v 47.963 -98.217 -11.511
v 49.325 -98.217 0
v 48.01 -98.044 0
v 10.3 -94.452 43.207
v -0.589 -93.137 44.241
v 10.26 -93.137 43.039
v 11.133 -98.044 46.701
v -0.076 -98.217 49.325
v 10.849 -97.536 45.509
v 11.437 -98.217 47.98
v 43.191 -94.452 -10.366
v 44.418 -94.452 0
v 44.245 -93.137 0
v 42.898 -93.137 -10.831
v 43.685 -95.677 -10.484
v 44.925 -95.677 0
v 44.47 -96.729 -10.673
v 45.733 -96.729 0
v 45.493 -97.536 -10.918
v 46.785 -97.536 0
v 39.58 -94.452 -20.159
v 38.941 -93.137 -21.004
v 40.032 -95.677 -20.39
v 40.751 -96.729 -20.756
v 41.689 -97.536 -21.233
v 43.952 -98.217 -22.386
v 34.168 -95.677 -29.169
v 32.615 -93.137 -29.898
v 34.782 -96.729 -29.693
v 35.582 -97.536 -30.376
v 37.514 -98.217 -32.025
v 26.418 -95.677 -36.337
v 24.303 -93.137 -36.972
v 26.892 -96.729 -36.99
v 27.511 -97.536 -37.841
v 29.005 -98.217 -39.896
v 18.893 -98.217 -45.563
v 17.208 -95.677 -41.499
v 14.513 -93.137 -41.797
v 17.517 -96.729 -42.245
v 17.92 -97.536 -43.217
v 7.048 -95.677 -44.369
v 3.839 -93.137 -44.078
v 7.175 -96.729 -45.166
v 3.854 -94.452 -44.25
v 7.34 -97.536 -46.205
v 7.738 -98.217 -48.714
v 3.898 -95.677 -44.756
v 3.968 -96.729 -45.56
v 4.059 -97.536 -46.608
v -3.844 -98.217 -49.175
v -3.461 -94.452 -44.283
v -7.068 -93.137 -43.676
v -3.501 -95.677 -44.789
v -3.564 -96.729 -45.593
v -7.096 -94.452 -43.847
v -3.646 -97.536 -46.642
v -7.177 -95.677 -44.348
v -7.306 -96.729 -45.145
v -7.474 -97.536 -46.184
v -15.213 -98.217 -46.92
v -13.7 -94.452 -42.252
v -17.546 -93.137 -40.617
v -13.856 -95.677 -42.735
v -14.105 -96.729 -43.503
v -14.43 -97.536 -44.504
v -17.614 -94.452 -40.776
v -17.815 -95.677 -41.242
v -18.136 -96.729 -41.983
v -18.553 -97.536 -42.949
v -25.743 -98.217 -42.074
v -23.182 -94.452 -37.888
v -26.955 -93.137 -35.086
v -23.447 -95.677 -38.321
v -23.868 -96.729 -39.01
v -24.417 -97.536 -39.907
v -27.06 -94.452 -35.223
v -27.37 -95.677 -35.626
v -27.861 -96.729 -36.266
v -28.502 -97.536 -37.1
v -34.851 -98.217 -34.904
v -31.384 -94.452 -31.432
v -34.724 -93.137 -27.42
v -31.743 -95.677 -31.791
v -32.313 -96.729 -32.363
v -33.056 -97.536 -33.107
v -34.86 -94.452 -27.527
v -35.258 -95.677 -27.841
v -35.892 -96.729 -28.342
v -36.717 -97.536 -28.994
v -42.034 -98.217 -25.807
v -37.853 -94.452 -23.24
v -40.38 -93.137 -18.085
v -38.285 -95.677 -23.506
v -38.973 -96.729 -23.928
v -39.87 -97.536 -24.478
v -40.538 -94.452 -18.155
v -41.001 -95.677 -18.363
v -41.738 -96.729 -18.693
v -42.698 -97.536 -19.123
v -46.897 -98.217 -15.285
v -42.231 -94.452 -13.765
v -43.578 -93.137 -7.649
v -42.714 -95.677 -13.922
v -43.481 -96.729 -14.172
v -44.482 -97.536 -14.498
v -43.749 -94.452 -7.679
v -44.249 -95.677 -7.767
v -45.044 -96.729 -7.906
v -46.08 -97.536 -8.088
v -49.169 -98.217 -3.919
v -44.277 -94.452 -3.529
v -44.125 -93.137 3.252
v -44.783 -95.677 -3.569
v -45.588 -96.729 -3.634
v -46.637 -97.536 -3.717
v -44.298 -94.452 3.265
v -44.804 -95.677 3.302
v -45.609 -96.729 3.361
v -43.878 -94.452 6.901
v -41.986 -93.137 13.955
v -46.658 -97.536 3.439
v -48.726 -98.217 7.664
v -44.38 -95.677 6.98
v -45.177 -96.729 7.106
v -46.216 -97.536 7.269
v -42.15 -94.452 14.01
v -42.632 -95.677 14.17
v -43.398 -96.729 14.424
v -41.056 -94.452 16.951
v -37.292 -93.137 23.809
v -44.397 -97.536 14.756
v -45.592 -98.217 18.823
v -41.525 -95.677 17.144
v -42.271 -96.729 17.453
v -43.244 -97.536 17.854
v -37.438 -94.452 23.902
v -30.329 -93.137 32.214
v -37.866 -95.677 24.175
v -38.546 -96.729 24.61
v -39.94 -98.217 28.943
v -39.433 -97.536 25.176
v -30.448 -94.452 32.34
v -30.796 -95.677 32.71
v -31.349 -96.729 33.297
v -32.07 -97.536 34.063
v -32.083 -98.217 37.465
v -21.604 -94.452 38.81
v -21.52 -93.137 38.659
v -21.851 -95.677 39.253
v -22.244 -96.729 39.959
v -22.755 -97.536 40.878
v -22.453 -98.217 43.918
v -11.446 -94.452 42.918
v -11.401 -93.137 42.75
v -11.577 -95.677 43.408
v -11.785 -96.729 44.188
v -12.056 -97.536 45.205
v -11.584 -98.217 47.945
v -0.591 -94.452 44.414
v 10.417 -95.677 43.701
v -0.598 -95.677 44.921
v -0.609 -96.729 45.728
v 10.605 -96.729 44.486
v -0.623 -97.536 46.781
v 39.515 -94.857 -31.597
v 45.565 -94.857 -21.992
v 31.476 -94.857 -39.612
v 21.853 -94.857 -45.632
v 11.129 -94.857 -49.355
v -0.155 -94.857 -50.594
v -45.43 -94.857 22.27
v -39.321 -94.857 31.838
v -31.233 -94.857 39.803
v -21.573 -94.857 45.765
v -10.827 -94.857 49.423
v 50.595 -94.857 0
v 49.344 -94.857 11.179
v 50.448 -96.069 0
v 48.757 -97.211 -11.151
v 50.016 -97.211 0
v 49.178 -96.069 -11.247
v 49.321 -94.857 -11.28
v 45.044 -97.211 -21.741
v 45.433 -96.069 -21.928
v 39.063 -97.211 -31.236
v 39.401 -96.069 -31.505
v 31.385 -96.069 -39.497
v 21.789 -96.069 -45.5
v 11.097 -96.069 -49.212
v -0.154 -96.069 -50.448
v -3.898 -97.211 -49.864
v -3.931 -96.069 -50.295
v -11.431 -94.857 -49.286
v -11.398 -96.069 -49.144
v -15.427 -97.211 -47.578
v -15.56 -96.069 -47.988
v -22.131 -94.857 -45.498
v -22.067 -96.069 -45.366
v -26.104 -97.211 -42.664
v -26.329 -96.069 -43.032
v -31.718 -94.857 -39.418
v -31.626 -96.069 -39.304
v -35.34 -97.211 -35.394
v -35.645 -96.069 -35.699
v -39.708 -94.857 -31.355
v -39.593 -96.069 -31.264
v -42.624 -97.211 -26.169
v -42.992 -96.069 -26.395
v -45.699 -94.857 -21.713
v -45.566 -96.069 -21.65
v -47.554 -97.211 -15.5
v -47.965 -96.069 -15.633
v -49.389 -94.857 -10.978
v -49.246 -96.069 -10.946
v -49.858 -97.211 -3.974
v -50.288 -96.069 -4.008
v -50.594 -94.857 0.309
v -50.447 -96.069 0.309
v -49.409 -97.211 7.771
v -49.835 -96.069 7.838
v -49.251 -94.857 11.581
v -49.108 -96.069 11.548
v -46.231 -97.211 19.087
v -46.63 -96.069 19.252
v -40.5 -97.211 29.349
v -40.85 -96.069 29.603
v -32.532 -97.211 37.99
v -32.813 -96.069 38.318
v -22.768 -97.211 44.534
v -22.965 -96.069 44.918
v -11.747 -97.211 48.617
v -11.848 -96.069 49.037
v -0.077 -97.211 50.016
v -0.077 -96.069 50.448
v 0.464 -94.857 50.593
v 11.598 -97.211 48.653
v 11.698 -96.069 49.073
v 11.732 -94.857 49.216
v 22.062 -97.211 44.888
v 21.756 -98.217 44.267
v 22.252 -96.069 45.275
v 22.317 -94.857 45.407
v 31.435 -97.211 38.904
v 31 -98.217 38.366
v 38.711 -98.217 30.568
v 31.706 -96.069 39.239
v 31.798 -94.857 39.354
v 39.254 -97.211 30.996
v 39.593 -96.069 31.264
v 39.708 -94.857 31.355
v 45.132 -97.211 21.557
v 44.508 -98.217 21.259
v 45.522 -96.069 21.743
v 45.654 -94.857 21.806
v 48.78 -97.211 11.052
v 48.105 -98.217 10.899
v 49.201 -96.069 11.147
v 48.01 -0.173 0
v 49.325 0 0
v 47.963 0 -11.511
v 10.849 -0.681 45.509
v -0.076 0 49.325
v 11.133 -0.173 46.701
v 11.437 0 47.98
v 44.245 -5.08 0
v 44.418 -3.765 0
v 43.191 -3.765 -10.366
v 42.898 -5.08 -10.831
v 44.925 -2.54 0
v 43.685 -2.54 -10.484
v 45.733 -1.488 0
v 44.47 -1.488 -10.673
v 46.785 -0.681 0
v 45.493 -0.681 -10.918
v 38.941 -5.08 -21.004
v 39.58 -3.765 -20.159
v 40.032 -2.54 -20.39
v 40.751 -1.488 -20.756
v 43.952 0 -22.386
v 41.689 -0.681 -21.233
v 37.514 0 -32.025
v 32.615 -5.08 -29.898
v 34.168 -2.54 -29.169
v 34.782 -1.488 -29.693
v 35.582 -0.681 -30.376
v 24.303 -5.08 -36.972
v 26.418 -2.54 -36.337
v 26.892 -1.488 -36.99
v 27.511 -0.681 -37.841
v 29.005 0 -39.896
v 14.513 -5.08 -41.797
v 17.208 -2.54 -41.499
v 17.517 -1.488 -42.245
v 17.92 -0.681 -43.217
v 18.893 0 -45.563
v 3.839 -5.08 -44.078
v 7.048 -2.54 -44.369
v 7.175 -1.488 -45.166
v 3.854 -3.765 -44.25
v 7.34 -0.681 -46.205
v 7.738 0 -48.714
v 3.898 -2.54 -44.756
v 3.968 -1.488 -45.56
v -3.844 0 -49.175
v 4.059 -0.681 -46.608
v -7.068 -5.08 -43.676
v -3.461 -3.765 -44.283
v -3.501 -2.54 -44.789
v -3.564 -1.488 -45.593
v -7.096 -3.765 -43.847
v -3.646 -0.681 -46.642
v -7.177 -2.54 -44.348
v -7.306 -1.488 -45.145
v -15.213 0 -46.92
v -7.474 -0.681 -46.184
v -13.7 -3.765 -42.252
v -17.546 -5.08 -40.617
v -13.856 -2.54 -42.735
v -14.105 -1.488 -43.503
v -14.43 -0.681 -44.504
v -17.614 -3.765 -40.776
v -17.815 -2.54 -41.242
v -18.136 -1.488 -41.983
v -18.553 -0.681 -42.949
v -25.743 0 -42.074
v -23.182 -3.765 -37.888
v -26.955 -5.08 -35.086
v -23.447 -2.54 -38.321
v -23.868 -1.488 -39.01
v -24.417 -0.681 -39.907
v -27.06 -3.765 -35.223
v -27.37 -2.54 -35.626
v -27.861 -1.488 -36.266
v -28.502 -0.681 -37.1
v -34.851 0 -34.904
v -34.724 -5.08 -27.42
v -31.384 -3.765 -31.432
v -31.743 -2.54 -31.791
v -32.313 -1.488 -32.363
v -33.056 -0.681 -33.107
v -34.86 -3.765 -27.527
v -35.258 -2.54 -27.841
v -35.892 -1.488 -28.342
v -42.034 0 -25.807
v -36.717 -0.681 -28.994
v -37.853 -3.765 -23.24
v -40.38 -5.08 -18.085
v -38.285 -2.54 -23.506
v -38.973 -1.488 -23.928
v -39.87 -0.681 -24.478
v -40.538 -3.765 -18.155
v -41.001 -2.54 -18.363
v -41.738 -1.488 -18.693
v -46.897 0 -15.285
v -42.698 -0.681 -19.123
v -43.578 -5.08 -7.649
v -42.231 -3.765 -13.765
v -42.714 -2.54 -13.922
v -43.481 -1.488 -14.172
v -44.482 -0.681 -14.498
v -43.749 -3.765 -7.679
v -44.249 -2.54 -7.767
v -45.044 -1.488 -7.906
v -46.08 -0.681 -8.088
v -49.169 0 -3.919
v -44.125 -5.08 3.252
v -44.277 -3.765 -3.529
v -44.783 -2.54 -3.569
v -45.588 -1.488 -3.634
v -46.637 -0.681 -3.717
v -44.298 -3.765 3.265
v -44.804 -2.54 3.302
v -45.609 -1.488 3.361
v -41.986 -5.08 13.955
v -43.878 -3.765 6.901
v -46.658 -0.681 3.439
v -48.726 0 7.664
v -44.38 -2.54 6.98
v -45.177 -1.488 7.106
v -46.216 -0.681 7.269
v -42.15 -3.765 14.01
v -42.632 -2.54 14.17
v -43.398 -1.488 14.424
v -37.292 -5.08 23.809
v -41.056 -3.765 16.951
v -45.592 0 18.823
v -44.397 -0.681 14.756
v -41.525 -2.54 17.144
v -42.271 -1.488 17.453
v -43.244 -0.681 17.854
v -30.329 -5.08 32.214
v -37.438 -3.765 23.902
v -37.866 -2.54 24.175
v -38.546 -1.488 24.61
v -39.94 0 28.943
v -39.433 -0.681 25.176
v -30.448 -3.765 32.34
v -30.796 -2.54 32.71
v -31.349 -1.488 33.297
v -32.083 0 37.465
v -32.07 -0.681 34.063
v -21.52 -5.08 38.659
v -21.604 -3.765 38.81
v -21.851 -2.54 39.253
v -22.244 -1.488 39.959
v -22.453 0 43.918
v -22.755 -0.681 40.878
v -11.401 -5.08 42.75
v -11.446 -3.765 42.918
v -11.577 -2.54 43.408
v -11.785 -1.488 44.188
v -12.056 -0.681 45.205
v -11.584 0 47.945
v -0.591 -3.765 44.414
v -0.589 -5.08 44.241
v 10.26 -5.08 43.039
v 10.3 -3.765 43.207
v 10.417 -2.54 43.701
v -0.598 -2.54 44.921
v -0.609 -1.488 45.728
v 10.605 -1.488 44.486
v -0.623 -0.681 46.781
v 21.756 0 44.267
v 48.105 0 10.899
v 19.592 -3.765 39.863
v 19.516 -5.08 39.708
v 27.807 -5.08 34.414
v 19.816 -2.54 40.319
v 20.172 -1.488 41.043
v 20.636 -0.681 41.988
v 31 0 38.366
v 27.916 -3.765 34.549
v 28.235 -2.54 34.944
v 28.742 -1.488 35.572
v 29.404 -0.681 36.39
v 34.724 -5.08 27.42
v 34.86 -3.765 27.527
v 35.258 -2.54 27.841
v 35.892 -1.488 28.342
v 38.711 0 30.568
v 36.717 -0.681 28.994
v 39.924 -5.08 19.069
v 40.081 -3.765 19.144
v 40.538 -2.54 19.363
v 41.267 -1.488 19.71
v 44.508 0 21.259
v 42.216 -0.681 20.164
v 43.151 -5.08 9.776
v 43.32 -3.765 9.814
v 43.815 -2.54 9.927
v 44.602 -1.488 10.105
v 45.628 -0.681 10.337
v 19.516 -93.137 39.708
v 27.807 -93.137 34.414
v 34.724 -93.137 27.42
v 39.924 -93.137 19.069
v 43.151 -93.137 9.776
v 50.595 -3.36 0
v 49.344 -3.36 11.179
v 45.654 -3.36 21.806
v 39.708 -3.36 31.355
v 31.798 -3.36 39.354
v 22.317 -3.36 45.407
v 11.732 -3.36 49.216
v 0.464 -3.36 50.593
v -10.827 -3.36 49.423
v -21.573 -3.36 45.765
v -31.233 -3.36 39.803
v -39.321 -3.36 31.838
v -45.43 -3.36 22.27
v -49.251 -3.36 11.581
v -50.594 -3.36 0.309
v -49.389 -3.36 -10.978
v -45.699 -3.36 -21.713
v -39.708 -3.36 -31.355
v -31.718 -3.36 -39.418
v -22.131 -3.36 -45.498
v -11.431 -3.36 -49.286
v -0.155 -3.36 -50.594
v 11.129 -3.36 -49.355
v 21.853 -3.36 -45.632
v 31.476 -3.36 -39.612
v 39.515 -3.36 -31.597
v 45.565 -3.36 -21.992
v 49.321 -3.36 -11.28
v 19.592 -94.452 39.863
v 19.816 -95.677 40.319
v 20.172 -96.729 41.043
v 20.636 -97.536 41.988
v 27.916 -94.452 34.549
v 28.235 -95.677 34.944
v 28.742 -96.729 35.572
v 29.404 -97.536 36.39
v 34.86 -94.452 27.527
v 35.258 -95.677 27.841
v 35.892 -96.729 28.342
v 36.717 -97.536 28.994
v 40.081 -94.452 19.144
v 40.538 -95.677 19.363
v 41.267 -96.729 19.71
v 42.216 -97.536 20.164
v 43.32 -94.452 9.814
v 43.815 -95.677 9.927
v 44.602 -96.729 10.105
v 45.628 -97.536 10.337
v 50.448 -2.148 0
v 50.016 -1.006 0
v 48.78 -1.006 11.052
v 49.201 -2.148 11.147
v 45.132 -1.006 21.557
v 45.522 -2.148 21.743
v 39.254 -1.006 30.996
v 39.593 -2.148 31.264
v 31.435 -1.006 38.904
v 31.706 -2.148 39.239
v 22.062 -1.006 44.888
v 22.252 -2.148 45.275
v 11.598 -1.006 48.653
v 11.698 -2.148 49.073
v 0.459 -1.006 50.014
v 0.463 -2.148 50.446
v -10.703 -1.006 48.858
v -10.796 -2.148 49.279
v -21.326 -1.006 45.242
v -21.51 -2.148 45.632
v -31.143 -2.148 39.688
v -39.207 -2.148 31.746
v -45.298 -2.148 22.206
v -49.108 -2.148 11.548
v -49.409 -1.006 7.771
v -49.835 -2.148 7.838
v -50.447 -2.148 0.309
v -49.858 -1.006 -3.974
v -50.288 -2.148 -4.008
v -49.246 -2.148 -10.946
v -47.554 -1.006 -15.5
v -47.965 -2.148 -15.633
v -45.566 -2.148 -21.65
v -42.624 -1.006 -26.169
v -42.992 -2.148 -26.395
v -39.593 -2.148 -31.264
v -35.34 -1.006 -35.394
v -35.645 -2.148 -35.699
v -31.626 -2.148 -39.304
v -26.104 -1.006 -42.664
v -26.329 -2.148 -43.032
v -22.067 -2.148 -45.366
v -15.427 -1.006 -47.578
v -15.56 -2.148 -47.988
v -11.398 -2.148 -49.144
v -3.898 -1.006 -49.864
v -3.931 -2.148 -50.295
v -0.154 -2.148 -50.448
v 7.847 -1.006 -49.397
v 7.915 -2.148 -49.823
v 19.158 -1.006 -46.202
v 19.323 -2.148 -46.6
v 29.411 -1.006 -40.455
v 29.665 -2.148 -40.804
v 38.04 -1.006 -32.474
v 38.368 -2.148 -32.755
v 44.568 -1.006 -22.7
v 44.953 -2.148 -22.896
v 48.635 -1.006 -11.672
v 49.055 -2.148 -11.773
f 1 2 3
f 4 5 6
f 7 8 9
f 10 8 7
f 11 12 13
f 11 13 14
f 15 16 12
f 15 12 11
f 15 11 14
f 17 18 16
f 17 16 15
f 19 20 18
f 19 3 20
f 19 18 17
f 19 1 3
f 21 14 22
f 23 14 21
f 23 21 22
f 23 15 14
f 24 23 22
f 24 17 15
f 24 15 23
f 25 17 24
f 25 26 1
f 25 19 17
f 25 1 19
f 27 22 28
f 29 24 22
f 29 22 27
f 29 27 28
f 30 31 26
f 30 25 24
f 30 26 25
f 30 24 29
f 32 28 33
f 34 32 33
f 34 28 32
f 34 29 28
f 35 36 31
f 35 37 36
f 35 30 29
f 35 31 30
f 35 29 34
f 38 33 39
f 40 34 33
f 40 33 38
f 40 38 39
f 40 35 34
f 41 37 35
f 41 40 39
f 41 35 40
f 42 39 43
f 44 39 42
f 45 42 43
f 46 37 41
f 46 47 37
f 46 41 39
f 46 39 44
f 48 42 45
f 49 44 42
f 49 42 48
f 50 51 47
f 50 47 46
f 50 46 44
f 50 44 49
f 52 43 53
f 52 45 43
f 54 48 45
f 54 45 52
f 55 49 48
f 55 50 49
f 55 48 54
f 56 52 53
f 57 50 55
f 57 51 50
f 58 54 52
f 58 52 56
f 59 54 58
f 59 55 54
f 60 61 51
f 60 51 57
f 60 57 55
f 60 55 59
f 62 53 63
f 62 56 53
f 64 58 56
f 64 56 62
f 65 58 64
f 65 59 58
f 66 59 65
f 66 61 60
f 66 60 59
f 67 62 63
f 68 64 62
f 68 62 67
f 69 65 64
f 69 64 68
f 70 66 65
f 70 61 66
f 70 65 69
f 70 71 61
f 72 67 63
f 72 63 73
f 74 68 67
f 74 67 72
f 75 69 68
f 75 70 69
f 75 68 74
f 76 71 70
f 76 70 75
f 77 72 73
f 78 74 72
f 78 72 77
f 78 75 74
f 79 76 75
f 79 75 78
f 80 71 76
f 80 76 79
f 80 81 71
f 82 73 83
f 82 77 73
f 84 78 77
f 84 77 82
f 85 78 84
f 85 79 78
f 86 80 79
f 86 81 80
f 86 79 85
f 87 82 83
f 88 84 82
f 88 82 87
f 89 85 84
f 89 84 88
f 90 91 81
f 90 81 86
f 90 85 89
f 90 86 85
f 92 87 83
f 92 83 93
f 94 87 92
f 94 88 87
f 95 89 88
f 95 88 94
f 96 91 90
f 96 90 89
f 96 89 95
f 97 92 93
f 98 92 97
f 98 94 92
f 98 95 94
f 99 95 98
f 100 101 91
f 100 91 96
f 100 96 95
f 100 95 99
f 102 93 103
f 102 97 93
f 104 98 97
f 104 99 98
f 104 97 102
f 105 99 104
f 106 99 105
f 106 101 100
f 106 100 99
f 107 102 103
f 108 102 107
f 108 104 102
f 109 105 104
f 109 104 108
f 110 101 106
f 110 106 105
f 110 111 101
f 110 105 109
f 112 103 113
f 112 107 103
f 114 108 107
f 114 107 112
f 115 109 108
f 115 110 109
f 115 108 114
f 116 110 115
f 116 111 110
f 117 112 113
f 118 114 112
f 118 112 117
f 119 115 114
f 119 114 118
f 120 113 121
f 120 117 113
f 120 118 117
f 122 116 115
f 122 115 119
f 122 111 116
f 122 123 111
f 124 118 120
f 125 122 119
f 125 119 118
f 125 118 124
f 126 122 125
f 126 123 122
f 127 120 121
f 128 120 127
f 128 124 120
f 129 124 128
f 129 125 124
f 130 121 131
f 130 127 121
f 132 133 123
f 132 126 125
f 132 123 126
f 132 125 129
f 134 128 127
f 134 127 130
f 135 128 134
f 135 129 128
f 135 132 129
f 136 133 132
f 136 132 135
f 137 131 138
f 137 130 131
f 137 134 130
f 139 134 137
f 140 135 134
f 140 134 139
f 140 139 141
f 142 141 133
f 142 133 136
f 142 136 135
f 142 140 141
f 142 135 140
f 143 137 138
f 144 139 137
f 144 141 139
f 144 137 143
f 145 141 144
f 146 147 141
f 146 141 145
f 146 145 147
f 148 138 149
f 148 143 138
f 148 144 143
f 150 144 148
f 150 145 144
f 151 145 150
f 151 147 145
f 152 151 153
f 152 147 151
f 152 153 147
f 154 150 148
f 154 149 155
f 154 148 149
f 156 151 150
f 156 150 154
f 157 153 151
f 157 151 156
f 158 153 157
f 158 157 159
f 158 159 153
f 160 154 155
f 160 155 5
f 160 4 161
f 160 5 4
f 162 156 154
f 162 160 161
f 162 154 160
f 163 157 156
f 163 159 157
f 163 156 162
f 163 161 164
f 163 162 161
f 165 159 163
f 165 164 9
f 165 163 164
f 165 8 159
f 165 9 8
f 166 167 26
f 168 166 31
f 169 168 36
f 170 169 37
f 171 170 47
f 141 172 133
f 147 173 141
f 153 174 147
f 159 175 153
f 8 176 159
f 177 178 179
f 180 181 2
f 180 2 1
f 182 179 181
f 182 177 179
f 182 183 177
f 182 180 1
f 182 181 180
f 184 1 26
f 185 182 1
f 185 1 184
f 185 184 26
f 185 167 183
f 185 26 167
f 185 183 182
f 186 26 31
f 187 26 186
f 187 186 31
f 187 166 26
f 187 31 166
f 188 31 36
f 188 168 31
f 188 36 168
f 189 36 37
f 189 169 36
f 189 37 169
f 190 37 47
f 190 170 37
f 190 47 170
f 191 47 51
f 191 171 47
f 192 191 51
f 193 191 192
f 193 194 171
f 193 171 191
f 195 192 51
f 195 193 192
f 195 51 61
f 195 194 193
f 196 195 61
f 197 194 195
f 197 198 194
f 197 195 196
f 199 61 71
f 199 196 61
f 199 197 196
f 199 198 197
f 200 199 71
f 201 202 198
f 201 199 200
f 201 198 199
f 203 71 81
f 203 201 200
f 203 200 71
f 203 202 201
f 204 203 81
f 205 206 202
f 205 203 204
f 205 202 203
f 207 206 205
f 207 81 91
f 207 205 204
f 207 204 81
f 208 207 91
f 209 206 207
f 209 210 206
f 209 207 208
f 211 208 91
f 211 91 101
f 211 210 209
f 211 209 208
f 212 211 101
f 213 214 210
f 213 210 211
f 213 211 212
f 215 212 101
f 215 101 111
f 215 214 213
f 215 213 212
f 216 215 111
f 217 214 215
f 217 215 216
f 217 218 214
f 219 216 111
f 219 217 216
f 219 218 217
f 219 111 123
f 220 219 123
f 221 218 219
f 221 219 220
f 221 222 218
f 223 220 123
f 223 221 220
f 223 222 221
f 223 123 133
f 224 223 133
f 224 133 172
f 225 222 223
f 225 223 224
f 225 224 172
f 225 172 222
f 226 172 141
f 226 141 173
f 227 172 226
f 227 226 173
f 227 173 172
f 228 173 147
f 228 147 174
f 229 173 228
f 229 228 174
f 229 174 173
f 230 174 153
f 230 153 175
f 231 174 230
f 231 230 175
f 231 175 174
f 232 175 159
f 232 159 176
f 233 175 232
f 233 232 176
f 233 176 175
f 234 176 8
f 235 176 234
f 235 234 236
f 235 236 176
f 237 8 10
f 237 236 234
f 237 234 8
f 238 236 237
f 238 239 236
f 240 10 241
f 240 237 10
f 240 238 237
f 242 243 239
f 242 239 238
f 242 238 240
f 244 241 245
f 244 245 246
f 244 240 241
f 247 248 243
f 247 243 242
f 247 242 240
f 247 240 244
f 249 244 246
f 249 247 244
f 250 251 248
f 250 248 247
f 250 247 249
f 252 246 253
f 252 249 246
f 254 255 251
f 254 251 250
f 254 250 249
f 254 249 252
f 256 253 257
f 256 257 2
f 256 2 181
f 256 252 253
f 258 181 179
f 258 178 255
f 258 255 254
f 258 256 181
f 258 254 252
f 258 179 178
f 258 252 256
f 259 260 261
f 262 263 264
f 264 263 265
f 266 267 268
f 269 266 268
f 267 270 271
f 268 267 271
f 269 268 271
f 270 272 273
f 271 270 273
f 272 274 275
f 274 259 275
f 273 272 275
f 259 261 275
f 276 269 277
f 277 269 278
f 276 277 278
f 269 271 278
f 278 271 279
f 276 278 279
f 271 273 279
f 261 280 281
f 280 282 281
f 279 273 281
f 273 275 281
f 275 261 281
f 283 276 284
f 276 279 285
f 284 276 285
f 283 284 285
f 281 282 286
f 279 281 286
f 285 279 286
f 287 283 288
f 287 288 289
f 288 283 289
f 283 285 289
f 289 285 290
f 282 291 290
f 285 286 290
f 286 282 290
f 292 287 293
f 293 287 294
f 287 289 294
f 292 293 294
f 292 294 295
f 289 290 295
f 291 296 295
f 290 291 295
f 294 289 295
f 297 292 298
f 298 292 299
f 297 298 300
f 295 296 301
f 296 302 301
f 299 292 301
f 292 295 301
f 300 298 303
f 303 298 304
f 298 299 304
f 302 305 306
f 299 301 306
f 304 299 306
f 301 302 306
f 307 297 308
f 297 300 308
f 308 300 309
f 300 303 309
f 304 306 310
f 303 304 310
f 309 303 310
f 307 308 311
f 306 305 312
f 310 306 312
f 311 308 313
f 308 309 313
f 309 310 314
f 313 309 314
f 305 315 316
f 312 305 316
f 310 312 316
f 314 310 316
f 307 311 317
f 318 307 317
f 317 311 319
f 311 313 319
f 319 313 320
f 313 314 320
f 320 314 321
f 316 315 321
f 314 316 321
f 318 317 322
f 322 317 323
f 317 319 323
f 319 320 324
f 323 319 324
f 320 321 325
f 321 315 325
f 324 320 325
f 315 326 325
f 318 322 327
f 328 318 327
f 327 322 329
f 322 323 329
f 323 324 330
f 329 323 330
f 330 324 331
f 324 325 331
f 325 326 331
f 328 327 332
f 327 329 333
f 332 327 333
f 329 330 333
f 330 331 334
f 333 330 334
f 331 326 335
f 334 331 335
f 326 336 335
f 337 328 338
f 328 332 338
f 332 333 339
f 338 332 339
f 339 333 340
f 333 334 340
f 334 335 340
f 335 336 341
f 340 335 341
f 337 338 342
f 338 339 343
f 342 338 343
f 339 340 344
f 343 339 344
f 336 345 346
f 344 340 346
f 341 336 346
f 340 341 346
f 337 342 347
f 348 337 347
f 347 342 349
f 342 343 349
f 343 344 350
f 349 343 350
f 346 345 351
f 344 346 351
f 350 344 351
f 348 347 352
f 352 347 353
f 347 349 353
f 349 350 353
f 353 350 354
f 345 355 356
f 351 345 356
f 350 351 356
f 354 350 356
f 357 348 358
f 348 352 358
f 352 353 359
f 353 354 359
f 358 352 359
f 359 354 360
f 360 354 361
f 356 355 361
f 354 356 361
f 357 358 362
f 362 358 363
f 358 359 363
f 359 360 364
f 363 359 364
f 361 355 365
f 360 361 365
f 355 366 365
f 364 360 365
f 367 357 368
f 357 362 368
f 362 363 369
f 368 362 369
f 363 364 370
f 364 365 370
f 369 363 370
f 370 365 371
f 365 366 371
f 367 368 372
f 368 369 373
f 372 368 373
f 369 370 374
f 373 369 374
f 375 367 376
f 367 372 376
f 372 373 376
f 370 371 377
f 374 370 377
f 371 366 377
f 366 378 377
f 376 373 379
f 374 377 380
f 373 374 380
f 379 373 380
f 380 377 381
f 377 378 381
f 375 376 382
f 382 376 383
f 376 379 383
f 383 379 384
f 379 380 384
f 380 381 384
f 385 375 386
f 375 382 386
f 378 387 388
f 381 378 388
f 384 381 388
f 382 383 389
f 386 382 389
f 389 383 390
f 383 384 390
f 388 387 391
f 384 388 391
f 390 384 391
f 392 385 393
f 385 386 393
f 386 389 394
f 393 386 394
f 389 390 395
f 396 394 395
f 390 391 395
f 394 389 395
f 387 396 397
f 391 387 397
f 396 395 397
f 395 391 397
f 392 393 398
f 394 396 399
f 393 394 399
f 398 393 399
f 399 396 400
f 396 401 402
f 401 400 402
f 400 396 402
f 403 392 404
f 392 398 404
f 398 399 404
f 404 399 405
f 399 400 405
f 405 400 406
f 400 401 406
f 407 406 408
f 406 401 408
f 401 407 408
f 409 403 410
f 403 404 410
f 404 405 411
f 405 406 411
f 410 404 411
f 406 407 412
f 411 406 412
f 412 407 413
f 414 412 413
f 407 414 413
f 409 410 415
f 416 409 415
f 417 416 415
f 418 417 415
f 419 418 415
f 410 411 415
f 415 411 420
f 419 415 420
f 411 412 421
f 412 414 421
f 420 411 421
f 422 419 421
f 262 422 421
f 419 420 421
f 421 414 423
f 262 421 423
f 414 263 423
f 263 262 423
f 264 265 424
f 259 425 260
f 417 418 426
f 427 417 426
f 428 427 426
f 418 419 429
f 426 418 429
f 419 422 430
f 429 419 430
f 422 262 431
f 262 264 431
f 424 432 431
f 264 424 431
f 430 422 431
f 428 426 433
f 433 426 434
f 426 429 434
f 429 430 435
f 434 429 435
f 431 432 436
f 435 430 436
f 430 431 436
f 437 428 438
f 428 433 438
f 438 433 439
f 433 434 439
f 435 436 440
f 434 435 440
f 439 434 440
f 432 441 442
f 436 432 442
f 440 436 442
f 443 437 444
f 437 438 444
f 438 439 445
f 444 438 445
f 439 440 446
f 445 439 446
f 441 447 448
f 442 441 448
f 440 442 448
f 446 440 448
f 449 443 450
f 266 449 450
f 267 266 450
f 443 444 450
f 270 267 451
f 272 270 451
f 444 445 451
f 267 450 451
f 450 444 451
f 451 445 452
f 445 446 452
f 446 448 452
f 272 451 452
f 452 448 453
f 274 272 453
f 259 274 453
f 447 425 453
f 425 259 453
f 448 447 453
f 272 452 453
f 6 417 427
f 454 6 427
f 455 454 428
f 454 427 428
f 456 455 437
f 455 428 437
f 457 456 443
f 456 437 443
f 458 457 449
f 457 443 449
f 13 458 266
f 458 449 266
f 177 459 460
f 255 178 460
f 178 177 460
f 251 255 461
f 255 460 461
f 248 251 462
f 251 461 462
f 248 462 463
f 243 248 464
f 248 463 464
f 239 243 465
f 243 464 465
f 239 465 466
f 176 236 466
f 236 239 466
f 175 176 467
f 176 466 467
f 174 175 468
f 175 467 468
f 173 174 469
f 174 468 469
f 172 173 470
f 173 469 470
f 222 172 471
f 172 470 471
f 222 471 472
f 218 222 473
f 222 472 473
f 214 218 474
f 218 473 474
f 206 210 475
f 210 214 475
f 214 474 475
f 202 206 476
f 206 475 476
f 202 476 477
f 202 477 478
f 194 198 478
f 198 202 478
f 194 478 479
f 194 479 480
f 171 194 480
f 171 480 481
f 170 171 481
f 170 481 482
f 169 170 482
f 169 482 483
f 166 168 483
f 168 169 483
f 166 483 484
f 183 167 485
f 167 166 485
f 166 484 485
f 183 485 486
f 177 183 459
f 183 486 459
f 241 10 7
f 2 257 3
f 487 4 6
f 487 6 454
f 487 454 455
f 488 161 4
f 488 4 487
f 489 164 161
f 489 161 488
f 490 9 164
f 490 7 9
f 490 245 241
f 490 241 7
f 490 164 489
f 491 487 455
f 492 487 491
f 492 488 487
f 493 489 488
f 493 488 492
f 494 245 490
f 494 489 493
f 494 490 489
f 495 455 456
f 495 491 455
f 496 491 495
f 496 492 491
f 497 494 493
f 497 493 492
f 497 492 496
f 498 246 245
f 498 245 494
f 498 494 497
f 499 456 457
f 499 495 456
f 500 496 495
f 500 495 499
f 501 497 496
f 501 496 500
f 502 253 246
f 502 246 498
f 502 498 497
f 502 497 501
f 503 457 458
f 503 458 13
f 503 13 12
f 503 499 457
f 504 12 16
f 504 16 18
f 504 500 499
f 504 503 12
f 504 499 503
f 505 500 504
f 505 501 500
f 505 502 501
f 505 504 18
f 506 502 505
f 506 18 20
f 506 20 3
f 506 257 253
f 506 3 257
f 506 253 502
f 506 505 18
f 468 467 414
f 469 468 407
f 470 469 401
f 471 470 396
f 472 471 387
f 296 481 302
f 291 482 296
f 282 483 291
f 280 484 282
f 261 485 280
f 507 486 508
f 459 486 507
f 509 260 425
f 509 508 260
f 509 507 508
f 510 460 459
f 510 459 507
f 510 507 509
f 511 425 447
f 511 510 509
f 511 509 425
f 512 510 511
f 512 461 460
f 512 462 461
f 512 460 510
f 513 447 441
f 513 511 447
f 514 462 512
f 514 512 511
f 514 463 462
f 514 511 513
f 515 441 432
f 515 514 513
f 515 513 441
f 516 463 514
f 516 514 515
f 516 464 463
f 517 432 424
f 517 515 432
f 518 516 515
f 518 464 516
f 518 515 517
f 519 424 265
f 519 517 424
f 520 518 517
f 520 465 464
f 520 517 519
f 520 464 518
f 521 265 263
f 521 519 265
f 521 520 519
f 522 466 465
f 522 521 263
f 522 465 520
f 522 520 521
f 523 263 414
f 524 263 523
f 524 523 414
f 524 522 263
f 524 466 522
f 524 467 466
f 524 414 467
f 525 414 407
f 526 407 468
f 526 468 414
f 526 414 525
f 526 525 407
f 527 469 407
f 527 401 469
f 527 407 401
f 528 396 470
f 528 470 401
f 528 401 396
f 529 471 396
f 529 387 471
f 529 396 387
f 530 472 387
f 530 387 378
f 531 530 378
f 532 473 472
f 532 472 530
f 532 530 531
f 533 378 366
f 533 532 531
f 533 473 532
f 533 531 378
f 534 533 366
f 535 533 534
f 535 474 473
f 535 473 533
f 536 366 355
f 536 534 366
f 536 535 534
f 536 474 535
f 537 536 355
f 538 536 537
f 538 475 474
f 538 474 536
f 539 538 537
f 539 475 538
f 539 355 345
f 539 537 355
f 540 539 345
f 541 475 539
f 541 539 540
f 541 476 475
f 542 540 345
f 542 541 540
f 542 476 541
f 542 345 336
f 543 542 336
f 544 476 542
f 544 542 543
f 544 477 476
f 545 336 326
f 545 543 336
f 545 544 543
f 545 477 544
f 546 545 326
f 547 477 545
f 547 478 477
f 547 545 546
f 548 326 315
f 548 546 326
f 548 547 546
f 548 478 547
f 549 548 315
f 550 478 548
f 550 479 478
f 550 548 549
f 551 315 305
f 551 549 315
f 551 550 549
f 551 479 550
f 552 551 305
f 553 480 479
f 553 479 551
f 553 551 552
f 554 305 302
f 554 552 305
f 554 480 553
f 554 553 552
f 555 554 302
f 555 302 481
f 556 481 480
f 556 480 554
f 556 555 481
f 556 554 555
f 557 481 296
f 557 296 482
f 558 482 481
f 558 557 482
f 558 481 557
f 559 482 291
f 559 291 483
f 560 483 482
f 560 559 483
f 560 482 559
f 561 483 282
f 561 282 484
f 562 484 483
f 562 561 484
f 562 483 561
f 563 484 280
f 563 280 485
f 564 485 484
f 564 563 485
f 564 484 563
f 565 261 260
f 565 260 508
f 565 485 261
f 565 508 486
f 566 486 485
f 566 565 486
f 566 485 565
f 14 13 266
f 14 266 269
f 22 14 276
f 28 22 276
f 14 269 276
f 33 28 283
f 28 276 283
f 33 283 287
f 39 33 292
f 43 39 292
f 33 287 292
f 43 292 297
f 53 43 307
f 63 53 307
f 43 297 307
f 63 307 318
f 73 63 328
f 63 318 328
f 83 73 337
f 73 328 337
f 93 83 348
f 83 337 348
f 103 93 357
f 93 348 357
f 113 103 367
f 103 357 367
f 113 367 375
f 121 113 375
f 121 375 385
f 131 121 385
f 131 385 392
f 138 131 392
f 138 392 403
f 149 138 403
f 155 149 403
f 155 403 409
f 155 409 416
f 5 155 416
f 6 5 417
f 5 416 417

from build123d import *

# Parameters (mm, degrees)
F1_DEPTH = 98.21704
F2_R     = 5.08
F4_R     = 5.08


# Not quite as in the source:
# - a fillet or chamfer that OpenCascade refuses, or shapes differently, is made with other operations: its cross-section is extruded or revolved along the edge and cut away or added


with BuildPart() as f1:
    # F0 (on Front) → F1 (new body)
    with BuildSketch(Plane.XZ):
        with BuildLine():
            ThreePointArc((11.7319880136, 49.2156378568), (-39.7076464503, -31.3547662371), (50.5946494444, 0))
            ThreePointArc((50.5946494444, 0), (39.7076464503, 31.3547662371), (11.7319880136, 49.2156378568))
        make_face()
        with BuildLine():
            ThreePointArc((44.2446494444, 0), (-34.7240452646, -27.4195128498), (10.2595373749, 43.0387139366))
            ThreePointArc((10.2595373749, 43.0387139366), (34.7240452646, 27.4195128498), (44.2446494444, 0))
        make_face(mode=Mode.SUBTRACT)
    extrude(amount=F1_DEPTH)

    # F2
    f2_edges = [f1.edges().sort_by_distance(p)[0] for p in [
        (-10.259537, -98.21704, -43.038714),
    ]]
    fillet(f2_edges, radius=F2_R)

    # F3: fillet of radius 5.08 on 1 edges, made by hand

    # F3_s1 → F3_t2 (revolve, cut)
    with BuildSketch(Plane.XY):
        with BuildLine():
            ThreePointArc((49.3246494444, -98.21704), (50.2665543256, -96.6529870592), (50.5946494444, -94.8569358349))
            Line((50.5946494444, -94.8569358349), (50.5946494444, -98.21704))
            Line((50.5946494444, -98.21704), (49.3246494444, -98.21704))
        make_face()
    revolve(axis=Axis((0, -98.21704, 0), (0, 1, 0)), mode=Mode.SUBTRACT)

    # F4
    f4_edges = [f1.edges().sort_by_distance(p)[0] for p in [
        (-10.259537, 0, -43.038714),
    ]]
    fillet(f4_edges, radius=F4_R)

    # F5: fillet of radius 5.08 on 1 edges, made by hand

    # F5_s1 → F5_t2 (revolve, cut)
    with BuildSketch(Plane.XY):
        with BuildLine():
            ThreePointArc((49.3246494444, 0), (50.2665543256, -1.5640529408), (50.5946494444, -3.3601041651))
            Line((50.5946494444, -3.3601041651), (50.5946494444, 0))
            Line((50.5946494444, 0), (49.3246494444, 0))
        make_face()
    revolve(axis=Axis((0, 0, 0), (0, -1, 0)), mode=Mode.SUBTRACT)


solid = f1.part
